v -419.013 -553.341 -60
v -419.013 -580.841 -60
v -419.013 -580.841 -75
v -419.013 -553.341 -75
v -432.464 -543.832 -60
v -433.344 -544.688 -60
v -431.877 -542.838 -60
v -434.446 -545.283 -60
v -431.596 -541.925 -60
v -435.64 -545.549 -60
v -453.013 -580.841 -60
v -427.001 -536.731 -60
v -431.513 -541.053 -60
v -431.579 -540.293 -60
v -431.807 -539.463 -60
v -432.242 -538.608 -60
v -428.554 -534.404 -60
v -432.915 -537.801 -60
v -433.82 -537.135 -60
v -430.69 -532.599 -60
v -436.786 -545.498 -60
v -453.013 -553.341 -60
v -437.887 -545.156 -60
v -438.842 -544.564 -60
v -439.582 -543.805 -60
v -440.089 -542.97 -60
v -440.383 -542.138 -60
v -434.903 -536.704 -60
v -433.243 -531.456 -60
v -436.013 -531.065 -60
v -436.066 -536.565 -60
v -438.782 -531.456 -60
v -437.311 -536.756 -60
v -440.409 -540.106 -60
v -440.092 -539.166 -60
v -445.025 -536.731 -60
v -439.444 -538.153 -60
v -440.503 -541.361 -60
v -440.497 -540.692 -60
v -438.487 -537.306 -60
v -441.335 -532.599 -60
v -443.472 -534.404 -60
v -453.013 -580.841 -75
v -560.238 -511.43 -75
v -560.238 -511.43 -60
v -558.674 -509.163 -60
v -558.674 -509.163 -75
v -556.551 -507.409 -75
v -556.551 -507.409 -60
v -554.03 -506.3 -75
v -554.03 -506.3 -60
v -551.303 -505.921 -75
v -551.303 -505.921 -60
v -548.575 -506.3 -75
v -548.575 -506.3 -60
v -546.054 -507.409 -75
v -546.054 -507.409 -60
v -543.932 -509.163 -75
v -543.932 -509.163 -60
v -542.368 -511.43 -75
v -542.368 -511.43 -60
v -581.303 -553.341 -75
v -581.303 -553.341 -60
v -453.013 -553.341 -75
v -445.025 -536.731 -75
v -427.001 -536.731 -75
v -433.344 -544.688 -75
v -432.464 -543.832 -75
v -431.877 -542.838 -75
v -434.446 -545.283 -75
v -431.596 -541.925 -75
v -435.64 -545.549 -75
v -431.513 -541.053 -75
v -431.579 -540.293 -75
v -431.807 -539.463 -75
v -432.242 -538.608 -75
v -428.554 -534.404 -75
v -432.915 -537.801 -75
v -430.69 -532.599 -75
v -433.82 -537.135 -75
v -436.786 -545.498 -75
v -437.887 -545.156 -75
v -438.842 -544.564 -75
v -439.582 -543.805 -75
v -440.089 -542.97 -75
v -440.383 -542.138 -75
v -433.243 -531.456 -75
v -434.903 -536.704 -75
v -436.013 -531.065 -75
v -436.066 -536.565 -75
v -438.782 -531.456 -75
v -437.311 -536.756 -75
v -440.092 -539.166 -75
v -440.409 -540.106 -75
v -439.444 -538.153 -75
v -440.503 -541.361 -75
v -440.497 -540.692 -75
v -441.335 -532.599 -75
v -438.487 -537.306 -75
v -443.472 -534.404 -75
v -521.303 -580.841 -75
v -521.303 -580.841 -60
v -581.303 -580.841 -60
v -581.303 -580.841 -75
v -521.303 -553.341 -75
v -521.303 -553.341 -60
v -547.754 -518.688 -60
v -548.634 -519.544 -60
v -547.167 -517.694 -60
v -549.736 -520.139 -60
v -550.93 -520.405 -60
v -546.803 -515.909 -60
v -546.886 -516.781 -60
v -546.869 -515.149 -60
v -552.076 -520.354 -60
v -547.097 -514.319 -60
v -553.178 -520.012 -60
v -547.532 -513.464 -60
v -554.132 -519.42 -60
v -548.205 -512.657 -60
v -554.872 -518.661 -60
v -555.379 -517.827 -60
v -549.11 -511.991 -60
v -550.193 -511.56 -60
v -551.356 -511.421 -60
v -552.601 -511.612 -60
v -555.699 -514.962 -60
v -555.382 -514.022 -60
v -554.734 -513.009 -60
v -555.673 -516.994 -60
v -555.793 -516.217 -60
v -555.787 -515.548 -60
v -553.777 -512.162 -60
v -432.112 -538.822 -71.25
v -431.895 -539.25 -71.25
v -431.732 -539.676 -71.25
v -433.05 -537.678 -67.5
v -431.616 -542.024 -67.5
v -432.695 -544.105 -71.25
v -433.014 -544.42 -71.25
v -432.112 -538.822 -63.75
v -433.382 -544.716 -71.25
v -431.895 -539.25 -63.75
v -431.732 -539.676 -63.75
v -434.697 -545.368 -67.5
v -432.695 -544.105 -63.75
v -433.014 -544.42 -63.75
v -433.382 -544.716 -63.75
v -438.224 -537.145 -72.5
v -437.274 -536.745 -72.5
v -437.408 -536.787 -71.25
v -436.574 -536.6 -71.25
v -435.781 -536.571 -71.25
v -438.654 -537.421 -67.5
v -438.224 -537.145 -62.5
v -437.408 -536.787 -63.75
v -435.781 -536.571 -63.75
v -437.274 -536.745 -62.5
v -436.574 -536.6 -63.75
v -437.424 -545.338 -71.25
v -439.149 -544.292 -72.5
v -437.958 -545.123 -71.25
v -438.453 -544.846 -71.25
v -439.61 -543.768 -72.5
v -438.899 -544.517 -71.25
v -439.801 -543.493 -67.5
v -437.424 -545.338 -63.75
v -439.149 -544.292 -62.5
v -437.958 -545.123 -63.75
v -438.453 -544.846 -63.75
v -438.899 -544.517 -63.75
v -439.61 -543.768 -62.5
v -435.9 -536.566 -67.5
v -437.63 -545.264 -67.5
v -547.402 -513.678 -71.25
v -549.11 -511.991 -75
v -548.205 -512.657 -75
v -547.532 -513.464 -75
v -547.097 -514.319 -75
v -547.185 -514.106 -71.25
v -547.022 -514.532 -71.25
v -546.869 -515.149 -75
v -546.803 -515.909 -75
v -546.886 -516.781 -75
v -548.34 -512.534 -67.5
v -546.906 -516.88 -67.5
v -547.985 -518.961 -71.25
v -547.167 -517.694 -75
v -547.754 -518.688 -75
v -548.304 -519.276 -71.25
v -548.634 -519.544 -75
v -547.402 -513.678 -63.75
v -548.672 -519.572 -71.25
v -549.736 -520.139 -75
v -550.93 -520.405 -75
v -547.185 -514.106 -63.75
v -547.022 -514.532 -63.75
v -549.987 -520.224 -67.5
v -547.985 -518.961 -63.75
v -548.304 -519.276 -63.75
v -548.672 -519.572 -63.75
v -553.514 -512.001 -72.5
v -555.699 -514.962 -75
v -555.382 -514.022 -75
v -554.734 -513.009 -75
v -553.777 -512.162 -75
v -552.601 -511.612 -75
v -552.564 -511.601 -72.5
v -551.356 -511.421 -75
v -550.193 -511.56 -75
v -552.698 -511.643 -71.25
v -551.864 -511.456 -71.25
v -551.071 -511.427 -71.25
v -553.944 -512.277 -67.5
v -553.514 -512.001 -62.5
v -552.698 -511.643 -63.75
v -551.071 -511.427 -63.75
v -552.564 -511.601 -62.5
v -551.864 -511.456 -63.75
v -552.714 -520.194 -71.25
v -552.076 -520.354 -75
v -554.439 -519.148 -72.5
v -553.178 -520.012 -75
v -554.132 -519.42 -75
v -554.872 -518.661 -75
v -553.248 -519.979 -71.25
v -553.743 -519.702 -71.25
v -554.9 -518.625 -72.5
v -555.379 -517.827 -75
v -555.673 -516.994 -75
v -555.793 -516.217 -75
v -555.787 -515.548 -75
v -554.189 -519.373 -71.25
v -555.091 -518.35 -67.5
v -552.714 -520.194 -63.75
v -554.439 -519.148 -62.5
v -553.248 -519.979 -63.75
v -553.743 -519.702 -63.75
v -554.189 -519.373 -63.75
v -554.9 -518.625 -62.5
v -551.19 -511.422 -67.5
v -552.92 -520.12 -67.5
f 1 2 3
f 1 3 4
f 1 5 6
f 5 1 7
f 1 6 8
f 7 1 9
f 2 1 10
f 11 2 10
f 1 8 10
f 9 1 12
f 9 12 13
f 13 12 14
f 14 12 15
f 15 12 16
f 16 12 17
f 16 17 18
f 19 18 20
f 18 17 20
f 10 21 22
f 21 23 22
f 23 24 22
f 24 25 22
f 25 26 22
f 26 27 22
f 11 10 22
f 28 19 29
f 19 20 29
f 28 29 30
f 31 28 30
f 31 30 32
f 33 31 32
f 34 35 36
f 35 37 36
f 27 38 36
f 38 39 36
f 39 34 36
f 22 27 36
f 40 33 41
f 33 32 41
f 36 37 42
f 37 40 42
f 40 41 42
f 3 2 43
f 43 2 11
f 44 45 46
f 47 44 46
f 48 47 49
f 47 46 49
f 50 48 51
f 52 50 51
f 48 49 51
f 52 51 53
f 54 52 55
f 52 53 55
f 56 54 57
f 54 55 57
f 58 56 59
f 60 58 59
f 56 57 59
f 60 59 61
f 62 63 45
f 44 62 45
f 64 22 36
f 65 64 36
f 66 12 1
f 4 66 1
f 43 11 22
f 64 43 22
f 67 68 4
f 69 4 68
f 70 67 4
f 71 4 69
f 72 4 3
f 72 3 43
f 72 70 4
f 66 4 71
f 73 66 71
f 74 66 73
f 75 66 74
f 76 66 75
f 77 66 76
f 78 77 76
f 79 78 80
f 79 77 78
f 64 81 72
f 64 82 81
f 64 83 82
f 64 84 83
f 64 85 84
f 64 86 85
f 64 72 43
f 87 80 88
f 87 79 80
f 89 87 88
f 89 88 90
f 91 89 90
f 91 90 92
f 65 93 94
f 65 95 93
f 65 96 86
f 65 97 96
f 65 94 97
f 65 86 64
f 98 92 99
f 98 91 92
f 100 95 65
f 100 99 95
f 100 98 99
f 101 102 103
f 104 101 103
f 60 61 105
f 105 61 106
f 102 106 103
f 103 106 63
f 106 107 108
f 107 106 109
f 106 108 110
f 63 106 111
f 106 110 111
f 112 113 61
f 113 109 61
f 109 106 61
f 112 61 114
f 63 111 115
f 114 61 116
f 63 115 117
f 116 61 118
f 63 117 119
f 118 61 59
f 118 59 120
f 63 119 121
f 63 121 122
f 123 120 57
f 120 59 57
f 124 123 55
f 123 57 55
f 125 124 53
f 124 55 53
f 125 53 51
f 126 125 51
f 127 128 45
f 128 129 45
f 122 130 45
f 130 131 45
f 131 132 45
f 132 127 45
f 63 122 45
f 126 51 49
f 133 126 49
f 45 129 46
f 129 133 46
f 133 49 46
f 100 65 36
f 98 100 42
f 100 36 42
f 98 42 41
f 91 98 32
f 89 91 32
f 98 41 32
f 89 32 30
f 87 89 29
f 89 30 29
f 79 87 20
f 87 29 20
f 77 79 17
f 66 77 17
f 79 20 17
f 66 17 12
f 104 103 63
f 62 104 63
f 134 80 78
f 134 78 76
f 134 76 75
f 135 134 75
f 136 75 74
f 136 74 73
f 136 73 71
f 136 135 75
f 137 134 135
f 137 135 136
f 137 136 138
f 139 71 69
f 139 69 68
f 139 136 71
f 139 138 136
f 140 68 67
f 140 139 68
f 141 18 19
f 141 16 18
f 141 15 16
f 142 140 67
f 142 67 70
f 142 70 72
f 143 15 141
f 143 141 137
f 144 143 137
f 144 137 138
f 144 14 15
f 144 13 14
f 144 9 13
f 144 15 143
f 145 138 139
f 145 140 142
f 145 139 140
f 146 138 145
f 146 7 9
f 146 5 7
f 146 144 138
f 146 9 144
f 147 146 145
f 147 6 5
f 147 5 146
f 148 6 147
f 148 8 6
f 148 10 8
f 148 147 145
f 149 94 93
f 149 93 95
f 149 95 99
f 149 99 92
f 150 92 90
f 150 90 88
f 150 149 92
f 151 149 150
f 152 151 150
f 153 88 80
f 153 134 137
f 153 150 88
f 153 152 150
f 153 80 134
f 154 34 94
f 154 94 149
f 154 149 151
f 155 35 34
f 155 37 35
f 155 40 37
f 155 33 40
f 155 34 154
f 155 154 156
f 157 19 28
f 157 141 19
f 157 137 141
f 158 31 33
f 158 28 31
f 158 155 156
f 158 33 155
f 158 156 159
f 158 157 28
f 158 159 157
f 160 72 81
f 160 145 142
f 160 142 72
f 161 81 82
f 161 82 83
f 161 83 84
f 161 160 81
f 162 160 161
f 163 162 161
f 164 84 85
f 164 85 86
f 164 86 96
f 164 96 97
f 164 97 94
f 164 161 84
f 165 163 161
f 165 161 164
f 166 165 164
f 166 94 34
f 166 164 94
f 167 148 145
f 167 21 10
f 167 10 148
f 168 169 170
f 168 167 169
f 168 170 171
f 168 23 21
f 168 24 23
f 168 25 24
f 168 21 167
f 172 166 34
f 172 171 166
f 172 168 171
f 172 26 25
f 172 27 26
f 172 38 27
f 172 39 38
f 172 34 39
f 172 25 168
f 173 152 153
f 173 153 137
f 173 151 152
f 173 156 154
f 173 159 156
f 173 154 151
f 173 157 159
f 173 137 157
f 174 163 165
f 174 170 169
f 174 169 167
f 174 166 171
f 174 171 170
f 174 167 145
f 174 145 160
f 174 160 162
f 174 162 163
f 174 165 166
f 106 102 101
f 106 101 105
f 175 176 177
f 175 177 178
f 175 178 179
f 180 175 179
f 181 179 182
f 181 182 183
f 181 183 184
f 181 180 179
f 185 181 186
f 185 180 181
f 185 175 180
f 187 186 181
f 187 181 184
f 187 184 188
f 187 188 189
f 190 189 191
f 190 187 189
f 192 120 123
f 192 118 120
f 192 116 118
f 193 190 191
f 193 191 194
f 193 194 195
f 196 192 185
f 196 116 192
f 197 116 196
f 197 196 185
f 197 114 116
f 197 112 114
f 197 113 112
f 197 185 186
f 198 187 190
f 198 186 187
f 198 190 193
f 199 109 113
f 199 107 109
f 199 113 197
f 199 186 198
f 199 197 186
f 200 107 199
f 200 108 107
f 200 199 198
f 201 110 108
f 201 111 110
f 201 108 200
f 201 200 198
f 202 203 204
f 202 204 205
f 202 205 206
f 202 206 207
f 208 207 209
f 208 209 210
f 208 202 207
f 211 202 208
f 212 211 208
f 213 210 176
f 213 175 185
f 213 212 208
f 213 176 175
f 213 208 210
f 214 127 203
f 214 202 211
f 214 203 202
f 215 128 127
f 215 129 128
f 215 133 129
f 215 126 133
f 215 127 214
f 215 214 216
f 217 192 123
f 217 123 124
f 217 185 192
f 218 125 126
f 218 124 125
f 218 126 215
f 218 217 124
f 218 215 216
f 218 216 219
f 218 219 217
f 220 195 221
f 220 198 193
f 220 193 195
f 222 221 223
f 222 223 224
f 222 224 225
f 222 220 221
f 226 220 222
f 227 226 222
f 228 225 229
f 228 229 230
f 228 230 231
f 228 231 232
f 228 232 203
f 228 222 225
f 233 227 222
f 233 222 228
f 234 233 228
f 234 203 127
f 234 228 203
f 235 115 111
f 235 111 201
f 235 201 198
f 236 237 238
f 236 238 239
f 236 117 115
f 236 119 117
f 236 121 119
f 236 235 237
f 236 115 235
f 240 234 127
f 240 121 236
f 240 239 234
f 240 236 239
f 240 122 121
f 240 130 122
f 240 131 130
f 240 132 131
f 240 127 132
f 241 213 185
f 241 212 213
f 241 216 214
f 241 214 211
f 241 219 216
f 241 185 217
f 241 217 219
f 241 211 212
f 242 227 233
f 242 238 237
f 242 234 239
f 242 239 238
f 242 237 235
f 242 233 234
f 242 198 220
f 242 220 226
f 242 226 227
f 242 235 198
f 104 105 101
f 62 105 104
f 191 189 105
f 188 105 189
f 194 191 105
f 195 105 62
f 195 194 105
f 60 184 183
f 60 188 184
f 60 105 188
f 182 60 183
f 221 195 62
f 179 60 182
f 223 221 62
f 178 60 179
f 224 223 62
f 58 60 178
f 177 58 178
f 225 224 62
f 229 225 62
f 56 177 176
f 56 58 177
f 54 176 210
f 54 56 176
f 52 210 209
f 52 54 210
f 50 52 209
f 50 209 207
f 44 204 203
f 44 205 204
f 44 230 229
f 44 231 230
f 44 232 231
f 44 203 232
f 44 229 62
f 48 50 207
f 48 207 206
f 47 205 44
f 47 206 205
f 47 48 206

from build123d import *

# Parameters (mm, degrees)
SKETCH3_R           = 10
SKETCH3_W           = 34
SKETCH3_H           = 2.5
SKETCH3_H_2         = 25
SKETCH3_W_2         = 60
BOSS_EXTRUDE1_DEPTH = 15


with BuildPart() as part:
    # Sketch3 → Boss-Extrude1 (new body)
    # profile 1 of 8: a face of its own
    with BuildSketch(Plane(origin=(0, 0, -60), x_dir=(-1, 0, 0), z_dir=(0, 0, -1))):
        with BuildLine():
            Line((521.302714664, -553.340939136), (581.302714664, -553.340939136))
            Line((581.302714664, -553.340939136), (560.237622535, -511.429916687))
            ThreePointArc((560.237622535, -511.429916687), (561.032798905, -513.613035946), (561.302714664, -515.920731906))
            ThreePointArc((561.302714664, -515.920731906), (548.995018703, -525.650816148), (542.367806792, -511.429916687))
            Line((542.367806792, -511.429916687), (521.302714664, -553.340939136))
        make_face()
    # profile 2 of 8: a face of its own
    with BuildSketch(Plane(origin=(0, 0, -60), x_dir=(-1, 0, 0), z_dir=(0, 0, -1))):
        with Locations((551.302714664, -515.920731906)):
            Circle(SKETCH3_R)
        with BuildLine():
            add(Edge.make_bspline(
                [(555.699368258, -514.961859042), (553.78162253, -506.168551853), (544.98831534, -508.086297582), (546.906061069, -516.879604771), (548.823806798, -525.67291196), (557.617113987, -523.755166231), (555.699368258, -514.961859042)],
                knots=[0, 0, 0, 0, 0.5, 0.5, 0.5, 1, 1, 1, 1], degree=3, weights=[1, 0.333333333, 0.333333333, 1, 0.333333333, 0.333333333, 1]))
        make_face(mode=Mode.SUBTRACT)
    # profile 3 of 8: a face of its own
    with BuildSketch(Plane(origin=(0, 0, -60), x_dir=(-1, 0, 0), z_dir=(0, 0, -1))):
        with Locations((436.012687074, -541.064646672)):
            Circle(SKETCH3_R)
        with BuildLine():
            add(Edge.make_bspline(
                [(440.409340668, -540.105773808), (438.49159494, -531.312466619), (429.698287751, -533.230212348), (431.616033479, -542.023519537), (433.533779208, -550.816826726), (442.327086397, -548.899080997), (440.409340668, -540.105773808)],
                knots=[0, 0, 0, 0, 0.5, 0.5, 0.5, 1, 1, 1, 1], degree=3, weights=[1, 0.333333333, 0.333333333, 1, 0.333333333, 0.333333333, 1]))
        make_face(mode=Mode.SUBTRACT)
    # profile 4 of 8: a face of its own
    with BuildSketch(Plane(origin=(0, 0, -60), x_dir=(-1, 0, 0), z_dir=(0, 0, -1))):
        with BuildLine():
            Line((419.012687074, -553.340939136), (453.012687074, -553.340939136))
            Line((453.012687074, -553.340939136), (445.024731197, -536.730703811))
            ThreePointArc((445.024731197, -536.730703811), (445.762570182, -538.842085225), (446.012687074, -541.064646672))
            ThreePointArc((446.012687074, -541.064646672), (433.790125627, -550.81452978), (427.000642951, -536.730703811))
            Line((427.000642951, -536.730703811), (419.012687074, -553.340939136))
        make_face()
    # profile 5 of 8: a face of its own
    with BuildSketch(Plane(origin=(0, 0, -60), x_dir=(-1, 0, 0), z_dir=(0, 0, -1))):
        with Locations((436.012687074, -554.590939136)):
            Rectangle(SKETCH3_W, SKETCH3_H)
    # profile 6 of 8: a face of its own
    with BuildSketch(Plane(origin=(0, 0, -60), x_dir=(-1, 0, 0), z_dir=(0, 0, -1))):
        with Locations((436.012687074, -568.340939136)):
            Rectangle(SKETCH3_W, SKETCH3_H_2)
    # profile 7 of 8: a face of its own
    with BuildSketch(Plane(origin=(0, 0, -60), x_dir=(-1, 0, 0), z_dir=(0, 0, -1))):
        with Locations((551.302714664, -554.590939136)):
            Rectangle(SKETCH3_W_2, SKETCH3_H)
    # profile 8 of 8: a face of its own
    with BuildSketch(Plane(origin=(0, 0, -60), x_dir=(-1, 0, 0), z_dir=(0, 0, -1))):
        with Locations((551.302714664, -568.340939136)):
            Rectangle(SKETCH3_W_2, SKETCH3_H_2)
    extrude(amount=BOSS_EXTRUDE1_DEPTH)


solid = part.part
